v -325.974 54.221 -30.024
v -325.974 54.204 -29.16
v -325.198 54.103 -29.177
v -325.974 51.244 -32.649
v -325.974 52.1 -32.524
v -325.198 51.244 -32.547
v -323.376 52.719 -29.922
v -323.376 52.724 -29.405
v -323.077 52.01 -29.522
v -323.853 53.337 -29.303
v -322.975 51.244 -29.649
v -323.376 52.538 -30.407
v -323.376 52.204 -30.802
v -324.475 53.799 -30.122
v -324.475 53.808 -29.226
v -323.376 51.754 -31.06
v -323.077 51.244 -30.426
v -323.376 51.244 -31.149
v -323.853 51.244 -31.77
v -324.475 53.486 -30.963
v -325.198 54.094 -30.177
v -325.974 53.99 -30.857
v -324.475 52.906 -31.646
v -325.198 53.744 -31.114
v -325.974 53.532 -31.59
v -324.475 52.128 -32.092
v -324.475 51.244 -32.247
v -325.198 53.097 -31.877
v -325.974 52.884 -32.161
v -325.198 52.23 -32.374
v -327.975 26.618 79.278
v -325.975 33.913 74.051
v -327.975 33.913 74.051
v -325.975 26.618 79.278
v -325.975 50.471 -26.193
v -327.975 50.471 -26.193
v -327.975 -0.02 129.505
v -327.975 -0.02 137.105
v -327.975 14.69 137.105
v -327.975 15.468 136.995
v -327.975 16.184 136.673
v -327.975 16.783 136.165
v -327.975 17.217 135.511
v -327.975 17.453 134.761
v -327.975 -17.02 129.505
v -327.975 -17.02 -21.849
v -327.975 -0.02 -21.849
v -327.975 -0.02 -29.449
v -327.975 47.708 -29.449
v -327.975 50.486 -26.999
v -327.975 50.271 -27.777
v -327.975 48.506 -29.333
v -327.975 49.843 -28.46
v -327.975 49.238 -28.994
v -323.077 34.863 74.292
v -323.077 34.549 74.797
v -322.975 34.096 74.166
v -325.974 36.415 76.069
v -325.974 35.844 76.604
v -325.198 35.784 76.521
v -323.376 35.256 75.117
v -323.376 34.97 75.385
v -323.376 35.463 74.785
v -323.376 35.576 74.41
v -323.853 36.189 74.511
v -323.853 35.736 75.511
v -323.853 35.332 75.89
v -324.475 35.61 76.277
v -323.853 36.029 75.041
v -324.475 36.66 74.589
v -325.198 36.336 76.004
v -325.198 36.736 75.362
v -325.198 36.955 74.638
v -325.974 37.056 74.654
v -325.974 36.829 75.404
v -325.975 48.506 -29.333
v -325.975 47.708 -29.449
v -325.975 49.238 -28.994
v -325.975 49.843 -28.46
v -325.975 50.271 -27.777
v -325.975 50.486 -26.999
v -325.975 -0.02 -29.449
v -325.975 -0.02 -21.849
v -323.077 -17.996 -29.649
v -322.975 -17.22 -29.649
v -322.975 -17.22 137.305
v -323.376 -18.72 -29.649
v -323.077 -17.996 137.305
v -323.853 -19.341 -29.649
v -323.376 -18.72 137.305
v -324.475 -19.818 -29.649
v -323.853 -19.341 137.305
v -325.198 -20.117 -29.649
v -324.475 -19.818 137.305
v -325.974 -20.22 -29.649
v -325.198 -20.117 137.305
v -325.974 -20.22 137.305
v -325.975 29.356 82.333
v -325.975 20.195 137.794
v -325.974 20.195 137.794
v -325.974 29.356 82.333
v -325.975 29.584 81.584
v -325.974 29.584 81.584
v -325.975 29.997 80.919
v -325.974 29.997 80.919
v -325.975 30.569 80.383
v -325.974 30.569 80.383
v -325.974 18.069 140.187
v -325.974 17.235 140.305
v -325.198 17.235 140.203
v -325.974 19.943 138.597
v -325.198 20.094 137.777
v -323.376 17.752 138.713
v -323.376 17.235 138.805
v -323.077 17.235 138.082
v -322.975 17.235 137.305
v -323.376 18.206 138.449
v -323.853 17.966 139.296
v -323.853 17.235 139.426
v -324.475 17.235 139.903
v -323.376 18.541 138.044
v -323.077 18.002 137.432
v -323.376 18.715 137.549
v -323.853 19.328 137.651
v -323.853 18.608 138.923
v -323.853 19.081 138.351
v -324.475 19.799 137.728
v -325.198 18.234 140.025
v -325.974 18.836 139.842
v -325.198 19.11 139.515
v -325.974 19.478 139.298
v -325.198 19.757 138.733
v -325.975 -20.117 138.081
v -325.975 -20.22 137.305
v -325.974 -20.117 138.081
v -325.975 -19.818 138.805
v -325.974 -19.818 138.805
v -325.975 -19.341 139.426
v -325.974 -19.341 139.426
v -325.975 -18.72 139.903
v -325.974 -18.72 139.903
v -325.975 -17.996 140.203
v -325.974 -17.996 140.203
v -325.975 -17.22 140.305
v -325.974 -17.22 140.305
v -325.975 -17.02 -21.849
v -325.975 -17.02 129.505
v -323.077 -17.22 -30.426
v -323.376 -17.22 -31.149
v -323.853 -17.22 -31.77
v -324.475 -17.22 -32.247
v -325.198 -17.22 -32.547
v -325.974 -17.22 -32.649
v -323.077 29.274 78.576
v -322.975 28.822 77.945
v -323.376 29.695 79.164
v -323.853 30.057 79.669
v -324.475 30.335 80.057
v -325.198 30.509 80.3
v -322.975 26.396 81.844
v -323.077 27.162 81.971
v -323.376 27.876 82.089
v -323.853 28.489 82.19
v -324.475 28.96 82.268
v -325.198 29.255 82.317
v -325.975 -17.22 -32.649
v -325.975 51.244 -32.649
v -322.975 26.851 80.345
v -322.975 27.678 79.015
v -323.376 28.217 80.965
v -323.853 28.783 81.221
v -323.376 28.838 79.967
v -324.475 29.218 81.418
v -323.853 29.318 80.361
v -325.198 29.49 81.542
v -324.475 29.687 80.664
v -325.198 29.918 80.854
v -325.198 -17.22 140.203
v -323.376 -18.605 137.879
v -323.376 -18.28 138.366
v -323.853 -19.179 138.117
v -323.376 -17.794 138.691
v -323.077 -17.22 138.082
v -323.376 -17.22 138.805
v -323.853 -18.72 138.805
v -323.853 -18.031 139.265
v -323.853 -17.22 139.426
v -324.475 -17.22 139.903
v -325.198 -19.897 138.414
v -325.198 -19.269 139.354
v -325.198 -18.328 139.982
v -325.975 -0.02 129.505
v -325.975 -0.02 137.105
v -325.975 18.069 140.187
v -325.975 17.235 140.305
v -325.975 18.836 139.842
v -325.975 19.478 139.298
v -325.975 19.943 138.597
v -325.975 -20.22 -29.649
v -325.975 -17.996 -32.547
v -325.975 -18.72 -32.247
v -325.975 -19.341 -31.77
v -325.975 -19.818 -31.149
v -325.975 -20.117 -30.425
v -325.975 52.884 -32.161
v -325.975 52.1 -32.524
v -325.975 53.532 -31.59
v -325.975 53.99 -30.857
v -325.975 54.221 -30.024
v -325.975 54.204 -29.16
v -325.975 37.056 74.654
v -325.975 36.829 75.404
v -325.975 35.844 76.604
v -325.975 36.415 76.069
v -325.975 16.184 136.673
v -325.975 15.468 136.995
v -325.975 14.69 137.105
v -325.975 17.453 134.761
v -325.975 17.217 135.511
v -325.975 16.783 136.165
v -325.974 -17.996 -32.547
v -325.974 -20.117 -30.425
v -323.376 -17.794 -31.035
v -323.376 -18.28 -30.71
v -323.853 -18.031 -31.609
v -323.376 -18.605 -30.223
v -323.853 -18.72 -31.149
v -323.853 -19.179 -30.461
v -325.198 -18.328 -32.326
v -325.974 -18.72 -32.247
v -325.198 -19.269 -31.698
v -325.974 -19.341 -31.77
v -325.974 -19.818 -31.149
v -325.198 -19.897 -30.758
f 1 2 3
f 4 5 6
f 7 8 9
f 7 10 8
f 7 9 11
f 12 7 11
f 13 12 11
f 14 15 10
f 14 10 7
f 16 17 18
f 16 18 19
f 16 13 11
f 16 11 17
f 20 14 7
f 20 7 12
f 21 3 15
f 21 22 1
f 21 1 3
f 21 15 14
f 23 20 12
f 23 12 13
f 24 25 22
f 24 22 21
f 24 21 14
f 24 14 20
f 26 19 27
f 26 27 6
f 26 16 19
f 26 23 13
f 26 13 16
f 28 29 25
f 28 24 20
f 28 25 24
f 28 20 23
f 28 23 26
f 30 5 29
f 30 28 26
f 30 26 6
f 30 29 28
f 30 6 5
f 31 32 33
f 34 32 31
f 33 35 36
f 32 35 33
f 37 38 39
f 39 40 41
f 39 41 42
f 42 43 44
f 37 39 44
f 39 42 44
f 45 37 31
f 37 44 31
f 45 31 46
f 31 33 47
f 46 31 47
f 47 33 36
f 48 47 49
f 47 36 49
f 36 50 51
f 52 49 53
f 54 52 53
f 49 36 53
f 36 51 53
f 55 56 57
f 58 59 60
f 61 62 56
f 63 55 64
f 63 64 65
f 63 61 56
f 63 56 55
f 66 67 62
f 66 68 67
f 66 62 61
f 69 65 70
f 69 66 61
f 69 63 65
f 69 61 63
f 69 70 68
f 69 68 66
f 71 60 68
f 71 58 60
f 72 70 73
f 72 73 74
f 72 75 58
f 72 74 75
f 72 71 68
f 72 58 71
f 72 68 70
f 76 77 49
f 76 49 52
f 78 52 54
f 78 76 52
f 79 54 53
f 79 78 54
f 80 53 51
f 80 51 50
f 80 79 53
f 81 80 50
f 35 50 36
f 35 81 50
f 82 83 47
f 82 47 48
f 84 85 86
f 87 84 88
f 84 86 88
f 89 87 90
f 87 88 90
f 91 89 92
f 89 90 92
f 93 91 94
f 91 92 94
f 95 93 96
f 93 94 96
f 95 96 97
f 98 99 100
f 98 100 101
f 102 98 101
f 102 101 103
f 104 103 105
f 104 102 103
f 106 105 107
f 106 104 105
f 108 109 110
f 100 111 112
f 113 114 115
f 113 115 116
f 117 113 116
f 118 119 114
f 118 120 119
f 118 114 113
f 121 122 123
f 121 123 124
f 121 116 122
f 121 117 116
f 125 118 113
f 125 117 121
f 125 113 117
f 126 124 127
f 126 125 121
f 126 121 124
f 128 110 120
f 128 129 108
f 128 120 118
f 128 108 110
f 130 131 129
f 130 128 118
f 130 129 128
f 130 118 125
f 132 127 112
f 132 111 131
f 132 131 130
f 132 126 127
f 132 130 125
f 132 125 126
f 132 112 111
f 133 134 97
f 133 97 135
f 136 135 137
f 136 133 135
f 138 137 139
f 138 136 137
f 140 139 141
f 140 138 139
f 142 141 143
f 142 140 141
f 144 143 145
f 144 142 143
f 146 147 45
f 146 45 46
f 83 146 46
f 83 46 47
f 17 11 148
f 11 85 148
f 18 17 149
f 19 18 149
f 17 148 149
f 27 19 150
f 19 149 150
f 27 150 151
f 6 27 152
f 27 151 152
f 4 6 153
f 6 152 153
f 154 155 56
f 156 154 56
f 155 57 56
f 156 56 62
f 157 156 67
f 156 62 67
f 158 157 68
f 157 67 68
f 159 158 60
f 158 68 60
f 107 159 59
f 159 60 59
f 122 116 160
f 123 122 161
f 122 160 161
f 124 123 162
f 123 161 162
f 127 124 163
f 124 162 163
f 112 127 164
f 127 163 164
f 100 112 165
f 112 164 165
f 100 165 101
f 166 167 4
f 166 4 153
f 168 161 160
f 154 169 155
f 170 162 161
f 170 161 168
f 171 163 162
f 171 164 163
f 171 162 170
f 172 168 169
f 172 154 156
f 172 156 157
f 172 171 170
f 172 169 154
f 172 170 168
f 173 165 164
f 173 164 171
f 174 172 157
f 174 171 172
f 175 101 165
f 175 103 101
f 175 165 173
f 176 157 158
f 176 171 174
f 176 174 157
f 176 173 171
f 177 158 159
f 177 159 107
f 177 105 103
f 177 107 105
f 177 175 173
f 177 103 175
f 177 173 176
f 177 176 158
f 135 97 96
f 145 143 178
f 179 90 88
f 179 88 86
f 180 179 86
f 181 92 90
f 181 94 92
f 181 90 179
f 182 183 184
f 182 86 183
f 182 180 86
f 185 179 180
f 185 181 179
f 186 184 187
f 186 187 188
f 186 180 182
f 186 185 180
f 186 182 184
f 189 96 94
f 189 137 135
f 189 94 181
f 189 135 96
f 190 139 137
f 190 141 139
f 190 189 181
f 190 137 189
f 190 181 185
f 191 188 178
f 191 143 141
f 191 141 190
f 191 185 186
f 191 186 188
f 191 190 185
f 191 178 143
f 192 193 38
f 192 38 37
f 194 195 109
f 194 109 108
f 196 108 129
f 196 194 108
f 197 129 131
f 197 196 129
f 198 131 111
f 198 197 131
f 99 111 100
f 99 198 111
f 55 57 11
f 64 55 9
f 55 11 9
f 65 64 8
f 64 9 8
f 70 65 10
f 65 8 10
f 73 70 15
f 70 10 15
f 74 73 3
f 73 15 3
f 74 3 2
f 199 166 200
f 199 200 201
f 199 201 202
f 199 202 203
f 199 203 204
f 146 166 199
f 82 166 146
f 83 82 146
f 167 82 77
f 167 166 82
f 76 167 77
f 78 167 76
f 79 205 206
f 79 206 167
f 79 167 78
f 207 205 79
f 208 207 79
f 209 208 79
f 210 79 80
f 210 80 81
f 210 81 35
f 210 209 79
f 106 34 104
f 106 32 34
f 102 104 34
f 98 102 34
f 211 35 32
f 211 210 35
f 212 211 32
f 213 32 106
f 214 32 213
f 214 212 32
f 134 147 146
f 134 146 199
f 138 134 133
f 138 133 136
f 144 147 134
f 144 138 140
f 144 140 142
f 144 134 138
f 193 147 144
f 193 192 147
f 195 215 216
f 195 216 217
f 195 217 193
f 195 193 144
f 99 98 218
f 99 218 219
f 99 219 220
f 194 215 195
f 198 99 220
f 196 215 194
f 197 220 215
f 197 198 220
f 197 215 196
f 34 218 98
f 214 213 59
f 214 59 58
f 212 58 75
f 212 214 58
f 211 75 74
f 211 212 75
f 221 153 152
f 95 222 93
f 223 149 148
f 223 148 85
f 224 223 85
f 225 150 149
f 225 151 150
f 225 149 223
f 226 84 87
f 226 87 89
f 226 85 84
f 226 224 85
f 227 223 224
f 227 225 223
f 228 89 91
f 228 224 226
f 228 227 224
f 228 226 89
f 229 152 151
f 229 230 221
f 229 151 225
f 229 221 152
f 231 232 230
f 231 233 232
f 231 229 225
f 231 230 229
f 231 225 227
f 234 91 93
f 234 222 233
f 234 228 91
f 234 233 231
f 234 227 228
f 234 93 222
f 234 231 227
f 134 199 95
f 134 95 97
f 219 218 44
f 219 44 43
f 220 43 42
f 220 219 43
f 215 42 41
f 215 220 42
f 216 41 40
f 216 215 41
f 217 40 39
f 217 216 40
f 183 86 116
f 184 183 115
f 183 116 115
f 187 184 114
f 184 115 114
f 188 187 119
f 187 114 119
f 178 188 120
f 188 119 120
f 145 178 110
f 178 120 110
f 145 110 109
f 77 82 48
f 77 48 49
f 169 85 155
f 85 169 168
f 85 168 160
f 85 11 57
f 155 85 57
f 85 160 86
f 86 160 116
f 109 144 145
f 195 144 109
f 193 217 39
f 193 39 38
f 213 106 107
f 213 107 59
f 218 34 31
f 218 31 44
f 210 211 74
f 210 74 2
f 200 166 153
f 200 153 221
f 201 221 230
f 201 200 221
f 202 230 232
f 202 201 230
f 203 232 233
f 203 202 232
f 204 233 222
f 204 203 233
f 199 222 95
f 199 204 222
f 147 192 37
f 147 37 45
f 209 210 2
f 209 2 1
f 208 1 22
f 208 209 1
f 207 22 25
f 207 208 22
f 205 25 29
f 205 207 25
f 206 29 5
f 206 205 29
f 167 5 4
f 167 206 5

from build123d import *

# Parameters (mm, degrees)
BOSS_EXTRUDE1_DEPTH = 2
BOSS_EXTRUDE2_DEPTH = 3
FILLET1_R           = 3


with BuildPart() as part:
    # Sketch1 → Boss-Extrude1 (new body)
    with BuildSketch(Plane.ZY.offset(329.974562358)):
        with BuildLine():
            Line((137.105001839, 14.690261729), (137.105001839, -0.019509128))
            Line((137.105001839, -0.019509128), (133.705001839, -0.019509128))
            Line((133.705001839, -0.019509128), (129.505001839, -0.019509128))
            Line((129.505001839, -0.019509128), (129.505001839, -17.019509128))
            Line((129.505001839, -17.019509128), (-21.848970599, -17.019509128))
            Line((-21.848970599, -17.019509128), (-21.848970599, -0.019509128))
            Line((-21.848970599, -0.019509128), (-26.048970599, -0.019509128))
            Line((-26.048970599, -0.019509128), (-29.448970599, -0.019509128))
            Line((-29.448970599, -0.019509128), (-29.448970599, 47.708117707))
            ThreePointArc((-29.448970599, 47.708117707), (-28.460366767, 49.843262649), (-26.192653512, 50.470684397))
            Line((-26.192653512, 50.470684397), (74.05116687, 33.912543624))
            Line((74.05116687, 33.912543624), (79.277875997, 26.617509644))
            Line((79.277875997, 26.617509644), (134.761318926, 17.452828418))
            ThreePointArc((134.761318926, 17.452828418), (136.440146781, 16.501657897), (137.105001839, 14.690261729))
        make_face()
    extrude(amount=-BOSS_EXTRUDE1_DEPTH)

    # Sketch1<4> → Boss-Extrude2 (add)
    with BuildSketch(Plane.ZY.offset(329.974562358)):
        with BuildLine():
            Line((140.305001839, -17.219509128), (140.305001839, 17.2353763))
            ThreePointArc((140.305001839, 17.2353763), (139.592657134, 19.176157909), (137.793913004, 20.195269182))
            Line((137.793913004, 20.195269182), (82.333171975, 29.356200538))
            ThreePointArc((82.333171975, 29.356200538), (81.237686153, 29.768607171), (80.383410411, 30.568845492))
            Line((80.383410411, 30.568845492), (76.604168861, 35.843616835))
            ThreePointArc((76.604168861, 35.843616835), (75.749893119, 36.643855156), (74.654407298, 37.056261789))
            Line((74.654407298, 37.056261789), (-29.160059434, 54.204197172))
            ThreePointArc((-29.160059434, 54.204197172), (-31.589752208, 53.531959584), (-32.648970599, 51.24430429))
            Line((-32.648970599, 51.24430429), (-32.648970599, -17.219509128))
            ThreePointArc((-32.648970599, -17.219509128), (-31.770290943, -19.340829471), (-29.648970599, -20.219509128))
            Line((-29.648970599, -20.219509128), (137.305001839, -20.219509128))
            ThreePointArc((137.305001839, -20.219509128), (139.426322182, -19.340829471), (140.305001839, -17.219509128))
        make_face()
    extrude(amount=BOSS_EXTRUDE2_DEPTH)

    # Fillet1
    fillet1_edges = [part.edges().sort_by_distance(p)[0] for p in [
        (-332.974562358, 17.012397581, -32.648970599),
        (-332.974562358, 53.531959584, -31.589752208),
        (-332.974562358, 45.63022948, 22.747173932),
        (-332.974562358, 36.643855156, 75.749893119),
        (-332.974562358, 33.206231163, 78.493789636),
        (-332.974562358, 29.768607171, 81.237686153),
        (-332.974562358, 24.77573486, 110.063542489),
        (-332.974562358, 19.176157909, 139.592657134),
        (-332.974562358, 0.007933586, 140.305001839),
        (-332.974562358, -19.340829471, 139.426322182),
        (-332.974562358, -20.219509128, 53.82801562),
        (-332.974562358, -19.340829471, -31.770290943),
    ]]
    fillet(fillet1_edges, radius=FILLET1_R - 0.0001)  # a hair under: the kernel refuses the full size


with BuildPart() as body_2:
    # Mirror1: mirrored copy
    add(part.part.mirror(Plane.ZY.offset(327.974562358)))


solid = body_2.part
